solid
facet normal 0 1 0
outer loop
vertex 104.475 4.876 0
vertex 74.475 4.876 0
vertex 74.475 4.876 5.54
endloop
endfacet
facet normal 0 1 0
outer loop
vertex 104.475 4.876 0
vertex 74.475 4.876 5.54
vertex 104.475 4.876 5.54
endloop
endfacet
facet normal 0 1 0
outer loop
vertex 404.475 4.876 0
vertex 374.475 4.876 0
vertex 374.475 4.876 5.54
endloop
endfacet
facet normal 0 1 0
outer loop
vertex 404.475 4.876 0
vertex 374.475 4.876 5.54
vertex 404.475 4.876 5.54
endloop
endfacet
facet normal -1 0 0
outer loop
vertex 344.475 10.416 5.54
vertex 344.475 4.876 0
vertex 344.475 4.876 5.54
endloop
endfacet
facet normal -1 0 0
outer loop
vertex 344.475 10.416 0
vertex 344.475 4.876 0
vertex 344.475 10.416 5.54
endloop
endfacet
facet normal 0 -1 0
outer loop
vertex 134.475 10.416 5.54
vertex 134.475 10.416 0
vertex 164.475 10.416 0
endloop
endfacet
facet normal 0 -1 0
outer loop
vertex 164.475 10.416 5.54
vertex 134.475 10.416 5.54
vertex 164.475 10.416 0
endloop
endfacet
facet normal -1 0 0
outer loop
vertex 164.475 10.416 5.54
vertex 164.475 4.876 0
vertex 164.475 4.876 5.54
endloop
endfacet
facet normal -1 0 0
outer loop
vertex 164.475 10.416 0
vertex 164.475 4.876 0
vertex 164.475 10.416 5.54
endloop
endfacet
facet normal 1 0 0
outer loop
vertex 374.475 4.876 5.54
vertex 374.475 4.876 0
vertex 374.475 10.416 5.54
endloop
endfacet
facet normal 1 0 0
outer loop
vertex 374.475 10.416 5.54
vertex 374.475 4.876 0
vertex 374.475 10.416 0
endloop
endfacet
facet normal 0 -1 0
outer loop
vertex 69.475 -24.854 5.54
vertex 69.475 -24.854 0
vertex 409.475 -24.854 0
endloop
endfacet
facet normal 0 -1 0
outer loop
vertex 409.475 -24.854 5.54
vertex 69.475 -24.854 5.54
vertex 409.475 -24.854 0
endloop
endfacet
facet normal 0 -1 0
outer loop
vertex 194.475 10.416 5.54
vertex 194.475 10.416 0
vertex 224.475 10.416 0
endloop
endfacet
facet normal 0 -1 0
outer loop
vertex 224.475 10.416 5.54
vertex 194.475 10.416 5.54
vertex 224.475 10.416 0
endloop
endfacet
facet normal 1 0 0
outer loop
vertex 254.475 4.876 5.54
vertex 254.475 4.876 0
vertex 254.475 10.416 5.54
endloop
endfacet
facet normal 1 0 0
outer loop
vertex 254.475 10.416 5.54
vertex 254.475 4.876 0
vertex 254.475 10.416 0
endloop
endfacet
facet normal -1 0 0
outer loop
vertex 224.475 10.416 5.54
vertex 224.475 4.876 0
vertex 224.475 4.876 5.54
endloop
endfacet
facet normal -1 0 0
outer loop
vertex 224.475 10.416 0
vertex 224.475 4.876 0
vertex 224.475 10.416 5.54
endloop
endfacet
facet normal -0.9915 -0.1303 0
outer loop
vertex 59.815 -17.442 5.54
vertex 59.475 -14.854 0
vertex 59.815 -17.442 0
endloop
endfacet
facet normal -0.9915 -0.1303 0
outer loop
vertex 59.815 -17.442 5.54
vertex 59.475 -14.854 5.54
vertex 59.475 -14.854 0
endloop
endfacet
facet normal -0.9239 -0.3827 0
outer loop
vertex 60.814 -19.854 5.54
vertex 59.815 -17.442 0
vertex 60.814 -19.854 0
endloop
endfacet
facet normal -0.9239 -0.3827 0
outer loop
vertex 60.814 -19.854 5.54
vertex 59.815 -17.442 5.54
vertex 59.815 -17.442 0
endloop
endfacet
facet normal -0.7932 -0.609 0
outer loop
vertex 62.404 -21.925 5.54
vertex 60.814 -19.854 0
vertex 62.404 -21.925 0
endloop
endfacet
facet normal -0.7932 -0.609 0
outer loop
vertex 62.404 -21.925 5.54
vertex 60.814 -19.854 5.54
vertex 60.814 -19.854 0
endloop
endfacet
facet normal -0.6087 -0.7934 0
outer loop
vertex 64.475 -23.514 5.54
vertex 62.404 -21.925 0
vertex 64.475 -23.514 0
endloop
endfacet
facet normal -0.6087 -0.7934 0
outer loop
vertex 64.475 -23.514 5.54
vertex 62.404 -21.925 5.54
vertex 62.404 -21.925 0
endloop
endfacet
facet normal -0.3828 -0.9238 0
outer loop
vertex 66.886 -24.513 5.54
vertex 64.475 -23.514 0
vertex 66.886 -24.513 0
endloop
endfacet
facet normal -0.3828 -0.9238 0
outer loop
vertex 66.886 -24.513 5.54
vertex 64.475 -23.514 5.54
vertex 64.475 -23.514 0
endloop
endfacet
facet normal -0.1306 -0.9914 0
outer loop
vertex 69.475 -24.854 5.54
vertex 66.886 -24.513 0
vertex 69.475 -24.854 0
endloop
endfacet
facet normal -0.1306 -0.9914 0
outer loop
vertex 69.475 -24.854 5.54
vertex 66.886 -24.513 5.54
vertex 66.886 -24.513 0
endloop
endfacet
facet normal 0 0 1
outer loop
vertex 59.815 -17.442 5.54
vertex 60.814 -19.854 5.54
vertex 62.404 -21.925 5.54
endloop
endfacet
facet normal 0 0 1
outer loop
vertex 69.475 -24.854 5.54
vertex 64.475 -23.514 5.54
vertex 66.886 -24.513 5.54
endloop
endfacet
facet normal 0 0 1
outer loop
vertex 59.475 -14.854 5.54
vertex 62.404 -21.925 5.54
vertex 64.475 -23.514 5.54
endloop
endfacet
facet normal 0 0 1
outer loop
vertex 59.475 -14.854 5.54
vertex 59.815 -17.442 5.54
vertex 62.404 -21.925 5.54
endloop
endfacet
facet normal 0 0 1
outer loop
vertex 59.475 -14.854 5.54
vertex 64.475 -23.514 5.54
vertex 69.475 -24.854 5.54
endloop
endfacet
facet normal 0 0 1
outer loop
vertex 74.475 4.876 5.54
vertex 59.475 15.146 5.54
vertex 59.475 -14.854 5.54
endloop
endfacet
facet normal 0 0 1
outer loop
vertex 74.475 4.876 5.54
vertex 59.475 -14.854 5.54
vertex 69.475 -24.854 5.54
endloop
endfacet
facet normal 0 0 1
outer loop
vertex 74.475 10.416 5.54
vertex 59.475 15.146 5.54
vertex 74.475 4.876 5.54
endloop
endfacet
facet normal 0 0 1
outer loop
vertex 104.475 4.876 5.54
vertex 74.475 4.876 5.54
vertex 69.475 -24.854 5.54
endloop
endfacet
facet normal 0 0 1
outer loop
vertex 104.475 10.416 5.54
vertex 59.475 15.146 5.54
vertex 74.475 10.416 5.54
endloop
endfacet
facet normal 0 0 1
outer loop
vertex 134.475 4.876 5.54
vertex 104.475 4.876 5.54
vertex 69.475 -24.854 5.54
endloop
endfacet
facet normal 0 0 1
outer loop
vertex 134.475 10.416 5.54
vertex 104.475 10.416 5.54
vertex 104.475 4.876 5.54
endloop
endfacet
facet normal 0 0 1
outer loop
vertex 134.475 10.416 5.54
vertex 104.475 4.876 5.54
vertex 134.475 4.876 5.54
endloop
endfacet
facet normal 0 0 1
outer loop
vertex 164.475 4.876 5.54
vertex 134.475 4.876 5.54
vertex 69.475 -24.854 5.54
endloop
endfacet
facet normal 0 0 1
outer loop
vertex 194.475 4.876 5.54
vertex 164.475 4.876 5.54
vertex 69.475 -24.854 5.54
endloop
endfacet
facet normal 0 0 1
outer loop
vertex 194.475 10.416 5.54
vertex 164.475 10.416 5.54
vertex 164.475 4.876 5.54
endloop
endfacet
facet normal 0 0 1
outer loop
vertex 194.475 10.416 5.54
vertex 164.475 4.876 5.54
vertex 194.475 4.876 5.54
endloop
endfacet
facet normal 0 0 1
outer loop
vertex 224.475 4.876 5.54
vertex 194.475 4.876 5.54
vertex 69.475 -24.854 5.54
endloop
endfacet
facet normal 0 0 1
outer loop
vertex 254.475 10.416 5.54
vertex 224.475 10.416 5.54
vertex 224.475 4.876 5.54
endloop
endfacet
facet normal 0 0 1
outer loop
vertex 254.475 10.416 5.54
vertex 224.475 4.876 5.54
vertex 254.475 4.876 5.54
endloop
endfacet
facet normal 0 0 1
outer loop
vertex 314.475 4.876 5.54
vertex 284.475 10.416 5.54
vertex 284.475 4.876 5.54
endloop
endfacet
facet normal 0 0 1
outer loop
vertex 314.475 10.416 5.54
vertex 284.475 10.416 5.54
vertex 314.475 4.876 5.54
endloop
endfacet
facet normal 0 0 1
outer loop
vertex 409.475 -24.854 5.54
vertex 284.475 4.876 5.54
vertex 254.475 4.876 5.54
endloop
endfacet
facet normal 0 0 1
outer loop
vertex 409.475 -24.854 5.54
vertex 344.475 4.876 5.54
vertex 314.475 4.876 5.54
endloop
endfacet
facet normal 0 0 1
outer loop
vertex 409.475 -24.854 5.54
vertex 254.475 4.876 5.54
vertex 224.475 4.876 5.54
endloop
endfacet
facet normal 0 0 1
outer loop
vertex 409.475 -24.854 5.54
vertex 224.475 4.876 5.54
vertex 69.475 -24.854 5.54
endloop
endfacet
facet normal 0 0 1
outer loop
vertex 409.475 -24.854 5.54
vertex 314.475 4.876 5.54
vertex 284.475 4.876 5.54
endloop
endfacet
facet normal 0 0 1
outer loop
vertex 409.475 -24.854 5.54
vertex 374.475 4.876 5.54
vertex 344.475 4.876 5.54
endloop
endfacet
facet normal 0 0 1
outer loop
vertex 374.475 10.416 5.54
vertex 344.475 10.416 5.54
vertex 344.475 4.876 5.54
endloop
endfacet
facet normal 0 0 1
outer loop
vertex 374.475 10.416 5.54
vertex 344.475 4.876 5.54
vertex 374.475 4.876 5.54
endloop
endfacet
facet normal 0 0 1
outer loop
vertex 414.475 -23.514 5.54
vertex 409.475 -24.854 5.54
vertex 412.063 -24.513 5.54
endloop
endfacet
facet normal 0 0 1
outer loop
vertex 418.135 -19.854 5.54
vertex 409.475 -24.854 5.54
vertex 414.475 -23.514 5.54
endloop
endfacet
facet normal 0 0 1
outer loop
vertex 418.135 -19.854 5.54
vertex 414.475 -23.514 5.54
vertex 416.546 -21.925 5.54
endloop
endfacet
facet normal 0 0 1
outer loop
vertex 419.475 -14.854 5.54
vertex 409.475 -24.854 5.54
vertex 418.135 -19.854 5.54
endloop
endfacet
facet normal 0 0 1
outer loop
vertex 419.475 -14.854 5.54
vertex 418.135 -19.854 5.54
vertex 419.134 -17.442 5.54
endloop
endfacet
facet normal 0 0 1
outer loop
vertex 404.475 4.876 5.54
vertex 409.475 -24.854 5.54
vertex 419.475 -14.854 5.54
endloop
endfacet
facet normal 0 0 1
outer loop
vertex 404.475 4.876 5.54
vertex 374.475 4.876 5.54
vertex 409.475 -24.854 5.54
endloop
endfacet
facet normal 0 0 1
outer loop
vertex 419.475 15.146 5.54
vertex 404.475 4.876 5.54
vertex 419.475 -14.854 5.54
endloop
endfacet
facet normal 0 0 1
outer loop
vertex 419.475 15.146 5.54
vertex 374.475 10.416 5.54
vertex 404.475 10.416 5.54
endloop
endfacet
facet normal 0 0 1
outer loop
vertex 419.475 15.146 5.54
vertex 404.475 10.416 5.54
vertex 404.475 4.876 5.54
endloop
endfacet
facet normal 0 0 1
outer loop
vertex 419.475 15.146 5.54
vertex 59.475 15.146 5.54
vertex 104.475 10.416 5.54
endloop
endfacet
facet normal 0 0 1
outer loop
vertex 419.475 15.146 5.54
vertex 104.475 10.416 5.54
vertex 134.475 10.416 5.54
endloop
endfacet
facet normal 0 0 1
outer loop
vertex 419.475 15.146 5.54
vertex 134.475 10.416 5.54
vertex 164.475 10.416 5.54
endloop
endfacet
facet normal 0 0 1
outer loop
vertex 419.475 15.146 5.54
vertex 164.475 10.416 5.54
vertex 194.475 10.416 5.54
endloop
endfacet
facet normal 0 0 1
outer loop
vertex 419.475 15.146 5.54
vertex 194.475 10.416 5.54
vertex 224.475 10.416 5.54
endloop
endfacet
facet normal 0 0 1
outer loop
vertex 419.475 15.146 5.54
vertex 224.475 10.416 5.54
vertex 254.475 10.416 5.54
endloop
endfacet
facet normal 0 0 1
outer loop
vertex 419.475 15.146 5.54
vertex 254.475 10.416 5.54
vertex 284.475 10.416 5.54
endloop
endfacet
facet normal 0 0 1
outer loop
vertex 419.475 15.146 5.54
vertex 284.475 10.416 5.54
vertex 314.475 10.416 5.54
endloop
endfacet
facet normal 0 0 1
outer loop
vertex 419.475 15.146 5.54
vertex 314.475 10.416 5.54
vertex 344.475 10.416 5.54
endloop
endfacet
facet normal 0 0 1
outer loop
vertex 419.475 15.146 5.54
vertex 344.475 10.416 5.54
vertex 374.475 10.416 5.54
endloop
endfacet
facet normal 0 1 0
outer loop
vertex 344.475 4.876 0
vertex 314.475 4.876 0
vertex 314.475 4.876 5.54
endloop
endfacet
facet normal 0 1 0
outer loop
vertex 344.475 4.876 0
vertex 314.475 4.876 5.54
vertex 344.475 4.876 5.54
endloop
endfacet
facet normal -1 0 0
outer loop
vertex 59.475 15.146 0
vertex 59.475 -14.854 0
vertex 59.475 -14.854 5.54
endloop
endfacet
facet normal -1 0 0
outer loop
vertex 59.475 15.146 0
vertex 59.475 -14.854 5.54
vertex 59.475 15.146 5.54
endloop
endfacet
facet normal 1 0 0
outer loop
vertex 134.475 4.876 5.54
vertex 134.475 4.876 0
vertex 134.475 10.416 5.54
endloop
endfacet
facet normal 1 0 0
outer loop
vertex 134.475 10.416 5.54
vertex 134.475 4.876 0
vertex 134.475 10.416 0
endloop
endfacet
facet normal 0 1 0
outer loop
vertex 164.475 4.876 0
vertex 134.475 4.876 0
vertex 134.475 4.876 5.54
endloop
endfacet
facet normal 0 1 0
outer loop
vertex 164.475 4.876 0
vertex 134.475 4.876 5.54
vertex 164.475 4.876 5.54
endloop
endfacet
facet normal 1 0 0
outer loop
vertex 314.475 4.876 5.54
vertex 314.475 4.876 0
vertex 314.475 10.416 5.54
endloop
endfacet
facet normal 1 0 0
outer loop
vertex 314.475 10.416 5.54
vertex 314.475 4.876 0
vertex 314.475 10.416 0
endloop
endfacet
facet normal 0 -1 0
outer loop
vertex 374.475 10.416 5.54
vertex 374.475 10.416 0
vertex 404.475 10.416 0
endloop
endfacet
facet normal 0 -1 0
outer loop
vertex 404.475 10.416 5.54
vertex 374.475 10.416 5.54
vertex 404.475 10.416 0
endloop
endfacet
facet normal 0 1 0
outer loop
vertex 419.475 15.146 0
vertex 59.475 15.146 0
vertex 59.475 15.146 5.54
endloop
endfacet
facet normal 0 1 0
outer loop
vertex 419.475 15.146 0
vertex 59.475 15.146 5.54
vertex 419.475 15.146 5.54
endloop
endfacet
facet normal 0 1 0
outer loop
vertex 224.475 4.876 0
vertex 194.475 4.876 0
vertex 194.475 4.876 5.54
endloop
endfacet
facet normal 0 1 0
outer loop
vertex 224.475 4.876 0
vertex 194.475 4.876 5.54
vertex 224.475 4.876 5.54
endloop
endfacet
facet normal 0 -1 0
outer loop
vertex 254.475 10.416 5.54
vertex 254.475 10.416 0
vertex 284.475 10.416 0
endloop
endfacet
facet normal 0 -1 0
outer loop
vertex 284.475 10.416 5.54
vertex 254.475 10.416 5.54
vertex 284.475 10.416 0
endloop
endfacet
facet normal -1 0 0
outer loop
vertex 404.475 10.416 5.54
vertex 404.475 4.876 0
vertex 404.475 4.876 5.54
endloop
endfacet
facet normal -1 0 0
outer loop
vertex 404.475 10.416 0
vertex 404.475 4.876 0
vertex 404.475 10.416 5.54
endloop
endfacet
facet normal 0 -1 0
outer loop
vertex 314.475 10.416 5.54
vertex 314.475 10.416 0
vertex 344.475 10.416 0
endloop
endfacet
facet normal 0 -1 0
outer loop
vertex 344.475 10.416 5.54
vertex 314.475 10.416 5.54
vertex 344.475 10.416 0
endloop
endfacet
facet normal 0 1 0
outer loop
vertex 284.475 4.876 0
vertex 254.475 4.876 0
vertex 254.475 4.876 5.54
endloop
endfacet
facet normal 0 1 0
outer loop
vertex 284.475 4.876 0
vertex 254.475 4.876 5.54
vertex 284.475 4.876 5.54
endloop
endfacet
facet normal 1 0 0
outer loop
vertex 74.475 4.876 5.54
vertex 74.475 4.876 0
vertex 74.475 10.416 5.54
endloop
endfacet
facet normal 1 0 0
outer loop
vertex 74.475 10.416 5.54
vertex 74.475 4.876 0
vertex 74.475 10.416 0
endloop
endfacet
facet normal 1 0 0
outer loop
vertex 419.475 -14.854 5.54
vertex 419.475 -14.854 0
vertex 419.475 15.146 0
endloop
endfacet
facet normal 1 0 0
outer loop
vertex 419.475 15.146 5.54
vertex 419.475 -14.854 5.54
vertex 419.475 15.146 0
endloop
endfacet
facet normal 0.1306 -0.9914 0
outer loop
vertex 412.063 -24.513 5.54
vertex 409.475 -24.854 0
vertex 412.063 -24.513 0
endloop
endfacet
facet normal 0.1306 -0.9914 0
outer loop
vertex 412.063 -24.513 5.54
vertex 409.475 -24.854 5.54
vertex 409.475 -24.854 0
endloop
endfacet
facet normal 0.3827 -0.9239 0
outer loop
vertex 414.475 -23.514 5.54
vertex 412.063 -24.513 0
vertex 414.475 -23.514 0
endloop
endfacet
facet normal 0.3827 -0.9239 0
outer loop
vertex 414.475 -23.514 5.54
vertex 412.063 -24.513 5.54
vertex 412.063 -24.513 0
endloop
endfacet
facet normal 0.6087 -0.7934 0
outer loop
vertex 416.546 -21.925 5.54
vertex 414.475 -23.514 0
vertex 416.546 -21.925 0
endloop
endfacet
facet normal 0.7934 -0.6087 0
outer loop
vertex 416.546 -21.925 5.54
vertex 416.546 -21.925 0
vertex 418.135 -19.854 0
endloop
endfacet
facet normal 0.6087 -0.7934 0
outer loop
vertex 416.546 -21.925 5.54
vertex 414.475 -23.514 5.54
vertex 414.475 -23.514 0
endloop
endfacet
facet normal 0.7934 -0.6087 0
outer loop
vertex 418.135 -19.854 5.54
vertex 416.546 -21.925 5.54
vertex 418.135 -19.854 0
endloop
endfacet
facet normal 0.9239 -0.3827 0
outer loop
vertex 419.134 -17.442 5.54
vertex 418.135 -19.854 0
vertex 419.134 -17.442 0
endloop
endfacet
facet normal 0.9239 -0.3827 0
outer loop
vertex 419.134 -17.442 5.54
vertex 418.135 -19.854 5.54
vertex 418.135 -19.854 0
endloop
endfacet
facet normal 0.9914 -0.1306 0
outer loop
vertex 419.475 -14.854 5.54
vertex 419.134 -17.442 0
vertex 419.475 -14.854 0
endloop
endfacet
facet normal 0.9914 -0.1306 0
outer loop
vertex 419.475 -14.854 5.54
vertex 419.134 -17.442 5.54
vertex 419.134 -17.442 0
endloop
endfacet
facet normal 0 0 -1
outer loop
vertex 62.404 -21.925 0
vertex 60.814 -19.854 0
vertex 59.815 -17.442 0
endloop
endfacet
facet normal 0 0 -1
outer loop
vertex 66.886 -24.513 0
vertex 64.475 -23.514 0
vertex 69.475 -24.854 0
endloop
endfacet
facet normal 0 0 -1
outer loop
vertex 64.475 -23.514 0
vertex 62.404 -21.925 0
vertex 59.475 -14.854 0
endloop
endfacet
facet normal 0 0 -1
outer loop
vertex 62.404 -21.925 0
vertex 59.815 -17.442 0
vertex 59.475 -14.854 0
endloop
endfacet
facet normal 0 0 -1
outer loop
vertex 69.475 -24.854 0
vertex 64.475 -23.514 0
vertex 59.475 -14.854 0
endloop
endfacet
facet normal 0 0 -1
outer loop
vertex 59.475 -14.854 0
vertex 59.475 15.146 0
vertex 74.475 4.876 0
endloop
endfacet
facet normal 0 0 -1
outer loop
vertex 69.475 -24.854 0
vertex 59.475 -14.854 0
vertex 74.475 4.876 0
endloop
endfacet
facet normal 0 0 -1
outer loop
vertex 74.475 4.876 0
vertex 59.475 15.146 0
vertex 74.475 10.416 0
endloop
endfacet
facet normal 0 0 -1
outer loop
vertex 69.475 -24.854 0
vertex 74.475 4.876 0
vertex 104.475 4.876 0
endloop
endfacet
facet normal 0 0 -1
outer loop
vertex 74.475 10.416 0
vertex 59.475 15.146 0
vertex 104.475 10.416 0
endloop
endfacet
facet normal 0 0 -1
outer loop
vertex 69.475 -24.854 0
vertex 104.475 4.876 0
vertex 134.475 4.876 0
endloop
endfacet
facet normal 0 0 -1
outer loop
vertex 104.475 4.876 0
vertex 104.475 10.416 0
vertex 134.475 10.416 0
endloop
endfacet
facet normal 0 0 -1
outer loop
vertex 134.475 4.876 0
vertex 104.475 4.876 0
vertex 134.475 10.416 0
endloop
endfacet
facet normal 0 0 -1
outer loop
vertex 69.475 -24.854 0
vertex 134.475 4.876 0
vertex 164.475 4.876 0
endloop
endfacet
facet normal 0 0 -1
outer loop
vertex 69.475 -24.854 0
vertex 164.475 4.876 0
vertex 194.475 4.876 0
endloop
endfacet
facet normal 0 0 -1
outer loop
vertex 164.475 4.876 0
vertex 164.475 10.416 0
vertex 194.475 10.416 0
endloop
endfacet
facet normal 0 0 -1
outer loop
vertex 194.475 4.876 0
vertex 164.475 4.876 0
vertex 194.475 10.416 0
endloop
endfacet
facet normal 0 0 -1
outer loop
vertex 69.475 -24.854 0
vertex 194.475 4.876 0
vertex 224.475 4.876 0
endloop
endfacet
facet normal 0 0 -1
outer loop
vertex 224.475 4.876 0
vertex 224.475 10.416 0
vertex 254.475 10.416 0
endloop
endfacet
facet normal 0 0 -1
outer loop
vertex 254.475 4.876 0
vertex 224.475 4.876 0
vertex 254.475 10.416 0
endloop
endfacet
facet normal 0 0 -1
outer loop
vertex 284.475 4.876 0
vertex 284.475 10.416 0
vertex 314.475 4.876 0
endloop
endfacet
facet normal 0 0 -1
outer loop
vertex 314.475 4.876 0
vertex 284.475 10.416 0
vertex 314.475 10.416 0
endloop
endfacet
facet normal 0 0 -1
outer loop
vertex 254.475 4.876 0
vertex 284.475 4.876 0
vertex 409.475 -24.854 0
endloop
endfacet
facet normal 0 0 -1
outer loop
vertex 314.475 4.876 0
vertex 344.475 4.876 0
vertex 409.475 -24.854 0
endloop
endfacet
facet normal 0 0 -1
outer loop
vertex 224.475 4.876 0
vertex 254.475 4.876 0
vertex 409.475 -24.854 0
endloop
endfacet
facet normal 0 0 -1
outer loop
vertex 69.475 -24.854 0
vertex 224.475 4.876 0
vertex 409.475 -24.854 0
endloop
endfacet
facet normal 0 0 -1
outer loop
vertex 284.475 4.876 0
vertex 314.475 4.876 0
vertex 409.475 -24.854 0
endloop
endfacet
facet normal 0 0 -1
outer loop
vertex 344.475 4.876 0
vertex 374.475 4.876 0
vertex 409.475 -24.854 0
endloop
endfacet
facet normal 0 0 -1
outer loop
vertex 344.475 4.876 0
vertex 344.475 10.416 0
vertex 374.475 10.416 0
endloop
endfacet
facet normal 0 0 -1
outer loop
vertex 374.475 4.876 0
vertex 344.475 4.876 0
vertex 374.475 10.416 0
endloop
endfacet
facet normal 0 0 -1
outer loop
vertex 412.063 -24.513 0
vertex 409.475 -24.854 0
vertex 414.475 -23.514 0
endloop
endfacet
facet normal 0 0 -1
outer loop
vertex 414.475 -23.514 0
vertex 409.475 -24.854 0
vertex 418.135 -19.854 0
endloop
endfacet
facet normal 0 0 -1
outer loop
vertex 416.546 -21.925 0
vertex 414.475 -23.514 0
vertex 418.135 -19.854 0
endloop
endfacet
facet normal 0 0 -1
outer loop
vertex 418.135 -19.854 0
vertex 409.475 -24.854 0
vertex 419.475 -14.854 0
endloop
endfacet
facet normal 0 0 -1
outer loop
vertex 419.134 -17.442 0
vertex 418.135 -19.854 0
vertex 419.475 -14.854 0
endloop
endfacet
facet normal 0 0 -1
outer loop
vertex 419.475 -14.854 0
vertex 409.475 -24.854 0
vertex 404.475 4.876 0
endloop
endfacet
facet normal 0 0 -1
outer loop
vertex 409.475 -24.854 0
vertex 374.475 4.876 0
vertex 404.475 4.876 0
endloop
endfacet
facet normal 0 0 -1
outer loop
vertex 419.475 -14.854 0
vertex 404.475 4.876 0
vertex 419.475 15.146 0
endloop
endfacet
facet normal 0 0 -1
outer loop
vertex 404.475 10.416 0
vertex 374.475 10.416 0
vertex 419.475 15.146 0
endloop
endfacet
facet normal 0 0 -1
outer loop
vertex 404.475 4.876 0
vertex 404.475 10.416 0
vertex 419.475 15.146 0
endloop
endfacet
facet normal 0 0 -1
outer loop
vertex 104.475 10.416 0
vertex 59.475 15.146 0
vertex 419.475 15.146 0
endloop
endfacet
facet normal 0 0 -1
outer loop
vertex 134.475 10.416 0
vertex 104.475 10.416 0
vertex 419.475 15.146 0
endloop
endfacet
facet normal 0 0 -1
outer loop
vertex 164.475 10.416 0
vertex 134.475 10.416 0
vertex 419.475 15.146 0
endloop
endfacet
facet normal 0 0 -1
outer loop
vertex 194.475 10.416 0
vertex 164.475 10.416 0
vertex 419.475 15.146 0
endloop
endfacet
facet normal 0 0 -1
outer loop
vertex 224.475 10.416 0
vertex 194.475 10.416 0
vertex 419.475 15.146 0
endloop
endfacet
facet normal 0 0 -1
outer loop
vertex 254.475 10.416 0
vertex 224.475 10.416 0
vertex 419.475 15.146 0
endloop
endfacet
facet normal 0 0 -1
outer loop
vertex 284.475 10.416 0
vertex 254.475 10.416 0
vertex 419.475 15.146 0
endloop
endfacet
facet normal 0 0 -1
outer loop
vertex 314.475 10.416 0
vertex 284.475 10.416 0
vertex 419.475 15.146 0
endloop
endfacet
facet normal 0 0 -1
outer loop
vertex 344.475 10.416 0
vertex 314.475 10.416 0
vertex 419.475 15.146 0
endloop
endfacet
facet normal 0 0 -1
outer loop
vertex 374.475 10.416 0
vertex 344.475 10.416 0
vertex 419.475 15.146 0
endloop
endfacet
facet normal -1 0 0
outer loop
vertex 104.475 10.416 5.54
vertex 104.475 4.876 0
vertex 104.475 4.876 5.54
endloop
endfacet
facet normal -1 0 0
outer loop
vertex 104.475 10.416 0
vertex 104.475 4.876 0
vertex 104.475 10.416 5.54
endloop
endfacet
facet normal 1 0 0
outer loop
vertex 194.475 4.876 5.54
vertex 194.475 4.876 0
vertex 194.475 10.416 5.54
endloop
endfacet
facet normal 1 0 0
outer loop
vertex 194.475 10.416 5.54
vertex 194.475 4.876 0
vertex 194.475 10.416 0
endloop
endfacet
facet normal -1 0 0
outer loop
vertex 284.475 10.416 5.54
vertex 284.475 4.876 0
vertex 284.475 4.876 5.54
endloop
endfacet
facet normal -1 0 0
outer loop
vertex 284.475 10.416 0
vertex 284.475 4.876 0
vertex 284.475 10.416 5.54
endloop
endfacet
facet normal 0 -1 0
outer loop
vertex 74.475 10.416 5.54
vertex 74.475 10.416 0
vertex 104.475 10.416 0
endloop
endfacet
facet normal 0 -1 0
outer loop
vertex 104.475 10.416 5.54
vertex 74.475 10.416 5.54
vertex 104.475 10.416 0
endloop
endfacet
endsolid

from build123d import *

# Parameters (mm, degrees)
SKETCH2_W           = 360
SKETCH2_H           = 40
SKETCH2_W_2         = 30
SKETCH2_H_2         = 5.54
BOSS_EXTRUDE1_DEPTH = 5.54
FILLET1_R           = 10


with BuildPart() as part:
    # Sketch2 → Boss-Extrude1 (new body)
    with BuildSketch(Plane.XY):
        with Locations((239.474602118, -4.853960239)):
            Rectangle(SKETCH2_W, SKETCH2_H)
        with Locations((89.474602118, 7.646039761)):
            Rectangle(SKETCH2_W_2, SKETCH2_H_2, mode=Mode.SUBTRACT)
        with Locations((149.474602118, 7.646039761)):
            Rectangle(SKETCH2_W_2, SKETCH2_H_2, mode=Mode.SUBTRACT)
        with Locations((209.474602118, 7.646039761)):
            Rectangle(SKETCH2_W_2, SKETCH2_H_2, mode=Mode.SUBTRACT)
        with Locations((269.474602118, 7.646039761)):
            Rectangle(SKETCH2_W_2, SKETCH2_H_2, mode=Mode.SUBTRACT)
        with Locations((329.474602118, 7.646039761)):
            Rectangle(SKETCH2_W_2, SKETCH2_H_2, mode=Mode.SUBTRACT)
        with Locations((389.474602118, 7.646039761)):
            Rectangle(SKETCH2_W_2, SKETCH2_H_2, mode=Mode.SUBTRACT)
    extrude(amount=BOSS_EXTRUDE1_DEPTH)

    # Fillet1
    fillet1_edges = [part.edges().sort_by_distance(p)[0] for p in [
        (419.474602118, -24.853960239, 2.77),
        (59.474602118, -24.853960239, 2.77),
    ]]
    fillet(fillet1_edges, radius=FILLET1_R)


solid = part.part
